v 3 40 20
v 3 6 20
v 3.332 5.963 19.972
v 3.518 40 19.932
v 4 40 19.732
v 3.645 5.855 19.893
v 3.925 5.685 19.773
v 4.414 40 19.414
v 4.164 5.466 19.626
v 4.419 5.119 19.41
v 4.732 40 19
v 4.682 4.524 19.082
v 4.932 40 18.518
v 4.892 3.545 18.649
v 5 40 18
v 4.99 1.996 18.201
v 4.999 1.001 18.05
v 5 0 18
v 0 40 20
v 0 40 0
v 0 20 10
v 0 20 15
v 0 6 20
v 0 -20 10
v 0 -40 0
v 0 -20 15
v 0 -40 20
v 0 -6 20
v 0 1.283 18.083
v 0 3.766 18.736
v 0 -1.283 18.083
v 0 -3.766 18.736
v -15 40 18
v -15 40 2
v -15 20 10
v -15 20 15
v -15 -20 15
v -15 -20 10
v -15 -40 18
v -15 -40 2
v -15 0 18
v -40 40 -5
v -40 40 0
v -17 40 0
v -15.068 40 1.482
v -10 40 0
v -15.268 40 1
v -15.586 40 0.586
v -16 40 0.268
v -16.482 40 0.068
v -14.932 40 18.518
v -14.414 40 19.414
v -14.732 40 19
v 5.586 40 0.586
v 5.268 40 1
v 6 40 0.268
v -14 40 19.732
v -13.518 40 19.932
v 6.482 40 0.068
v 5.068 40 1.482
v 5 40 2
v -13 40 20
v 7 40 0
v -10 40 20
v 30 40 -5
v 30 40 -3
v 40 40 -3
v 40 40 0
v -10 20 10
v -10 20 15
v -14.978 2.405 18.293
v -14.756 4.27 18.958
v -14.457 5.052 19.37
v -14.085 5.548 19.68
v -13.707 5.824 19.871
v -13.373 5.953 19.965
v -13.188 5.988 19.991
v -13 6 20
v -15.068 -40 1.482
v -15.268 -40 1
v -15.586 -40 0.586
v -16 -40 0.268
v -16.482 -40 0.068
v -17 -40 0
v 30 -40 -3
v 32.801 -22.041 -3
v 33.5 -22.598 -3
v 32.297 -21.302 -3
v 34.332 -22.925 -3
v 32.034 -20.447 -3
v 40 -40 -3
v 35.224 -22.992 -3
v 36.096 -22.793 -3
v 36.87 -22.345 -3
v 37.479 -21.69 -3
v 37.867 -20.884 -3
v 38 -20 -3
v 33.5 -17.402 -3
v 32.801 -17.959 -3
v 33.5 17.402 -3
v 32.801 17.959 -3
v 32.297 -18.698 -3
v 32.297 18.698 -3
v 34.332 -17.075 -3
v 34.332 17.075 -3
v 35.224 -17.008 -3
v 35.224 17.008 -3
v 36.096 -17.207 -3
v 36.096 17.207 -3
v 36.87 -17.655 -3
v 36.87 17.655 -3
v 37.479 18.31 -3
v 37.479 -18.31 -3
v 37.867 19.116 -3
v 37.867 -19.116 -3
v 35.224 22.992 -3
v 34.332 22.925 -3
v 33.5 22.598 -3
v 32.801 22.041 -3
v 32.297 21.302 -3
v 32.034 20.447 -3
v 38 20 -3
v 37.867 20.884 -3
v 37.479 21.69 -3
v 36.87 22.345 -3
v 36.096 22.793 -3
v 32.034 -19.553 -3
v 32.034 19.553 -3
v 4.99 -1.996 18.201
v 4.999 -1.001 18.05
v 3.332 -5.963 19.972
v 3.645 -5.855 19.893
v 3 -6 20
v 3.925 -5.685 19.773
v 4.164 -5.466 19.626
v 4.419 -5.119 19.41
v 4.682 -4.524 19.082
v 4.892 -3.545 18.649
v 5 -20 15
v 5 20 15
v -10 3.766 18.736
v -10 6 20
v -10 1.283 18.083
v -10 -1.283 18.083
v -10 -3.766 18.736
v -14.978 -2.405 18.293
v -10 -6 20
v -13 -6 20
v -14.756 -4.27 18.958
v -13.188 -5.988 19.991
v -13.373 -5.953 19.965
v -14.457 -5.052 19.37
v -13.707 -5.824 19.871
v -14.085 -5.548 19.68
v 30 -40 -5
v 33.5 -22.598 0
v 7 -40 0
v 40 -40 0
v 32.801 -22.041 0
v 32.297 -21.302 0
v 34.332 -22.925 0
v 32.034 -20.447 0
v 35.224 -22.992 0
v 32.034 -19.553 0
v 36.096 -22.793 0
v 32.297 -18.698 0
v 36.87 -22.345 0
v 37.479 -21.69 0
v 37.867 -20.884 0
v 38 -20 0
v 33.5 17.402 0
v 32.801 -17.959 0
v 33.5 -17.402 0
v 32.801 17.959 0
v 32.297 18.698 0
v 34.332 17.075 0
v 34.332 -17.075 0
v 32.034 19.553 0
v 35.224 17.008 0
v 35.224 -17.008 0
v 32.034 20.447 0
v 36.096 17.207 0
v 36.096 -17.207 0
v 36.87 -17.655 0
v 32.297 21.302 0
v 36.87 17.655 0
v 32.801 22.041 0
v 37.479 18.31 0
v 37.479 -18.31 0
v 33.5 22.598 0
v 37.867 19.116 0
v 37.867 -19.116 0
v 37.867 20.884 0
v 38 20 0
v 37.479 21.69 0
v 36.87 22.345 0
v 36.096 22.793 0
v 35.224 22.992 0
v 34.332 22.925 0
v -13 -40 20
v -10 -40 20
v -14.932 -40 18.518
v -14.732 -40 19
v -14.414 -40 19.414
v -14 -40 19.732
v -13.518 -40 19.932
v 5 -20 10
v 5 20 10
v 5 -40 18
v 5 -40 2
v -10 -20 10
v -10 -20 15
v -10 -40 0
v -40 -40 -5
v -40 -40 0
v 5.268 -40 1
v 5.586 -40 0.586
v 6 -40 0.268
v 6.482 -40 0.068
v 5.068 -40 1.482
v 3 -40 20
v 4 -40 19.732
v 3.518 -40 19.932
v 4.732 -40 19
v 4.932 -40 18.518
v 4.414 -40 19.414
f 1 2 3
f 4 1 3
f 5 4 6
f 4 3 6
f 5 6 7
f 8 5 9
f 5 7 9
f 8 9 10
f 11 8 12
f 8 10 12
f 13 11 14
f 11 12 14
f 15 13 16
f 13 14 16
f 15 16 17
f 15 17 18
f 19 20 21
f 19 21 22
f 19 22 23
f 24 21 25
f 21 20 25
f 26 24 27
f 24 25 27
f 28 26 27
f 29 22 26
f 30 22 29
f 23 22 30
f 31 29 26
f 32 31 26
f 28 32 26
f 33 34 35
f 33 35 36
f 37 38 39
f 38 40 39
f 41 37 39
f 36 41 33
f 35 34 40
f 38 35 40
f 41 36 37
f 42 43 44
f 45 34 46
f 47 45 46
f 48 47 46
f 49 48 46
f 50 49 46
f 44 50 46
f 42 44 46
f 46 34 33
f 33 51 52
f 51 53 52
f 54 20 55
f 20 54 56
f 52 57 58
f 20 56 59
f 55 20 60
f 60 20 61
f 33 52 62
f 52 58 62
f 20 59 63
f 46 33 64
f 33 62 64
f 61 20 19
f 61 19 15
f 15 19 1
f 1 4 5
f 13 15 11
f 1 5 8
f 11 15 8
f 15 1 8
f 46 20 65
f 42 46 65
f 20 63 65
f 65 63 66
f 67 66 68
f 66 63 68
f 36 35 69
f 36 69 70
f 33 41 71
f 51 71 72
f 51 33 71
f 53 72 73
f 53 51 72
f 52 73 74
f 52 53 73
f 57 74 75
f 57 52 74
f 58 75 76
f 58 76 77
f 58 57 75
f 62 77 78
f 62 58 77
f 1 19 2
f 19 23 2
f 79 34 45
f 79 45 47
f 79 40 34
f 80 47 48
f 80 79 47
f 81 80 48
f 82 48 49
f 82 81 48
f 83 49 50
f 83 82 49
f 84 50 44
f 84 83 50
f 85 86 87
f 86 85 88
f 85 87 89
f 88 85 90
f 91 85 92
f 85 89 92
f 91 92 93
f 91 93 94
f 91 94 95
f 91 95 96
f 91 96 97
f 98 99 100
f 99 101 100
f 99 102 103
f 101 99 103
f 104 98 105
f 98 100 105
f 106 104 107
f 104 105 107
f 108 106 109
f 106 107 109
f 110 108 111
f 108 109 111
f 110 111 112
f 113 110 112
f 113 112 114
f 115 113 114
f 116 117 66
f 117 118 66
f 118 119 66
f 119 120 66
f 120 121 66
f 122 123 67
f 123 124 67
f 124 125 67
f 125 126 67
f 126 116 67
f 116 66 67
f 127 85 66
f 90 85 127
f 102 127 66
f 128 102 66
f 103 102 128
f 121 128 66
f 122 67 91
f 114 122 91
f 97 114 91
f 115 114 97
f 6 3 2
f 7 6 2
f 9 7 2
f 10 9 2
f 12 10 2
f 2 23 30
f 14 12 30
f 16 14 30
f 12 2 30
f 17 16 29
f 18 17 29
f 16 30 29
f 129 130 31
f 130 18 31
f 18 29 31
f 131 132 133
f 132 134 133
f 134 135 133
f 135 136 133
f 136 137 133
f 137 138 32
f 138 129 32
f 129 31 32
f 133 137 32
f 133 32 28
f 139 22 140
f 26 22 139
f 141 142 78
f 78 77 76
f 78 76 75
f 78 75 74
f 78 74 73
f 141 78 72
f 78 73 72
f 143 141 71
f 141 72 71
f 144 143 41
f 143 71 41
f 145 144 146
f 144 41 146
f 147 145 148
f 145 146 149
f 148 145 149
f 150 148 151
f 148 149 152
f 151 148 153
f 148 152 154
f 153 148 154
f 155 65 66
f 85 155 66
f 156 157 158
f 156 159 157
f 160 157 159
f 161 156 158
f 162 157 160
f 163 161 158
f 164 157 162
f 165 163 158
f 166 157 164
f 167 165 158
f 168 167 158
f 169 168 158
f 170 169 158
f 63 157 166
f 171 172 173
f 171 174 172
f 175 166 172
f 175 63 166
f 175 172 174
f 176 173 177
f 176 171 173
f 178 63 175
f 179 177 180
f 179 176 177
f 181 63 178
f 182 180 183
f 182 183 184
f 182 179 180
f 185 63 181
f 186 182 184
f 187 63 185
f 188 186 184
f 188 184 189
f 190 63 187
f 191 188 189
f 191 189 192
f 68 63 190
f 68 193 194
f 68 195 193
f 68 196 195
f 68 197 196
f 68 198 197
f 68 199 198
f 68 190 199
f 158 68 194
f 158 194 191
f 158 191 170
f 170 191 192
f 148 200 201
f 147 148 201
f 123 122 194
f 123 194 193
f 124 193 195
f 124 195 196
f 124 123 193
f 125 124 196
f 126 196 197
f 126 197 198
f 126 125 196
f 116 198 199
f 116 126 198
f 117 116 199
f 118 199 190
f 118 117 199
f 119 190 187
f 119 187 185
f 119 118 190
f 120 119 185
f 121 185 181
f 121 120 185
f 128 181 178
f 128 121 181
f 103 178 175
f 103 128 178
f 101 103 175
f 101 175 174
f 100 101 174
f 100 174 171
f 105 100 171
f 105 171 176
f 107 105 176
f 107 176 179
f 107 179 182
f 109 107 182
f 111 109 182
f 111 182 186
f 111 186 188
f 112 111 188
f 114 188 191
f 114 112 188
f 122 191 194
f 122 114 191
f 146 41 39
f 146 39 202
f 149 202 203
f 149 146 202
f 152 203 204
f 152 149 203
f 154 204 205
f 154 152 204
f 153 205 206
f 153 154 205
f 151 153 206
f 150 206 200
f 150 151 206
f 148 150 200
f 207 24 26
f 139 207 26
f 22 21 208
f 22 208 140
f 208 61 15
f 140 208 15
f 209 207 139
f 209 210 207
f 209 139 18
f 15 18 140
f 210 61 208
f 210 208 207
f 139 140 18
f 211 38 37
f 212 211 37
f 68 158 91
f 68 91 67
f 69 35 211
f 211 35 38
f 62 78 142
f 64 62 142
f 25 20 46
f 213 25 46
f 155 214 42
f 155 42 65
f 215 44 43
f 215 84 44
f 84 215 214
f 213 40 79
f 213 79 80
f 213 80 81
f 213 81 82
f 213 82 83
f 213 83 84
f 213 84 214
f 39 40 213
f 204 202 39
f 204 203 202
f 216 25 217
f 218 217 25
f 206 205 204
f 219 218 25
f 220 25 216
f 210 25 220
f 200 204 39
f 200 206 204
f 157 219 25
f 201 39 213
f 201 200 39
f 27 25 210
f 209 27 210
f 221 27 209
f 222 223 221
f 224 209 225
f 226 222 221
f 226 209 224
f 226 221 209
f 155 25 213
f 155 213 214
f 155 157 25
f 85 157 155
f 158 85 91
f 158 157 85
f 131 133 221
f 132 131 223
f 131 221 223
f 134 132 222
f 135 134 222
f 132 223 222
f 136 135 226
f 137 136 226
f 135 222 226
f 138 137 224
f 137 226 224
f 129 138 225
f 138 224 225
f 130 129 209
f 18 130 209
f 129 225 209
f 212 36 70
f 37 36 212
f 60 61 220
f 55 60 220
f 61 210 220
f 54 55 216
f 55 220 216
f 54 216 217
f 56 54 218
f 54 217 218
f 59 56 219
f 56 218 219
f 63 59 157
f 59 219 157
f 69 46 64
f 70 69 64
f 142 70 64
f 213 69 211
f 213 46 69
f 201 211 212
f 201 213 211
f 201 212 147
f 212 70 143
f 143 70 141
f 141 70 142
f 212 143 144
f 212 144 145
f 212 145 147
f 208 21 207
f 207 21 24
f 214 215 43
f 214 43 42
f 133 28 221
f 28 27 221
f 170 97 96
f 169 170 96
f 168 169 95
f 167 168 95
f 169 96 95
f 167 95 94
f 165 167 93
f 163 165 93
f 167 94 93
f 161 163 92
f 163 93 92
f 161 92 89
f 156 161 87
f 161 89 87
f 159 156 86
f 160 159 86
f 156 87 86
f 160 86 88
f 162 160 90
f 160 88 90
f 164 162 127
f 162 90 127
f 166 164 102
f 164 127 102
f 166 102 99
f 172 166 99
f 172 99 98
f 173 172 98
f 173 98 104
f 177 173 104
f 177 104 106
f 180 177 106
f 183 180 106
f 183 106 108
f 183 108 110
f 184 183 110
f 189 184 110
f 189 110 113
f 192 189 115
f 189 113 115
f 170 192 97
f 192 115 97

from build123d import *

# Parameters (mm, degrees)
F0_W      = 5
F0_H      = 20
F1_DEPTH  = 40
F2_R      = 2
F3_R      = 2
F4_W      = 40
F4_H      = 5
F5_DEPTH  = 25
F6_W      = 10
F6_H      = 80
F7_DEPTH  = 3
F8_R      = 3
F9_DEPTH  = 3
F12_R     = 10
F13_DEPTH = 25


with BuildPart() as f1:
    # F0 (on Front) → F1 (new body, symmetric)
    with BuildSketch(Plane.XZ):
        with Locations((-12.5, 10)):
            Rectangle(F0_W, F0_H)
        Polygon((0, 0), (-10, 0), (-15, 0), (-40, 0), (-40, -5), (0, -5), align=None)
        with Locations((2.5, 10)):
            Rectangle(F0_W, F0_H)
        Polygon((5, 0), (0, 0), (0, -5), (30, -5), (30, 0), align=None)
    extrude(amount=F1_DEPTH, both=True)

    # F2
    f2_edges = [f1.edges().sort_by_distance(p)[0] for p in [
        (5, 0, 0),
        (-15, 0, 0),
    ]]
    fillet(f2_edges, radius=F2_R)

    # F3
    f3_edges = [f1.edges().sort_by_distance(p)[0] for p in [
        (-15, 0, 20),
        (5, 0, 20),
    ]]
    fillet(f3_edges, radius=F3_R)

    # F4 (on face) → F5 (cut)
    with BuildSketch(Plane(origin=(-15, 0, 0), x_dir=(0, -1, 0), z_dir=(-1, 0, 0))):
        with Locations((0, 12.5)):
            Rectangle(F4_W, F4_H)
    extrude(amount=-F5_DEPTH, mode=Mode.SUBTRACT)

    # F6 (on face) → F7 (join)
    with BuildSketch(Plane.XY):
        with Locations((35, 0)):
            Rectangle(F6_W, F6_H)
    extrude(amount=-F7_DEPTH)


with BuildPart() as f9:
    # F8 (on face) → F9 (new body)
    with BuildSketch(Plane(origin=(0, 0, -3), x_dir=(1, 0, 0), z_dir=(0, 0, -1))):
        with Locations((35, 20)):
            Circle(F8_R)
    extrude(amount=-F9_DEPTH)


with BuildPart() as f10_1:
    # F10: instance of F9
    add(f9.part.mirror(Plane.XZ))


with BuildPart() as f1_1:
    add(f1.part)

    # F11: cut F10_1, F9
    add(f10_1.part, mode=Mode.SUBTRACT)
    add(f9.part, mode=Mode.SUBTRACT)

    # F12 (on face) → F13 (cut)
    with BuildSketch(Plane(origin=(-15, 0, 0), x_dir=(0, -1, 0), z_dir=(-1, 0, 0))):
        with Locations((0, 28)):
            Circle(F12_R)
    extrude(amount=-F13_DEPTH, mode=Mode.SUBTRACT)


solid = f1_1.part
